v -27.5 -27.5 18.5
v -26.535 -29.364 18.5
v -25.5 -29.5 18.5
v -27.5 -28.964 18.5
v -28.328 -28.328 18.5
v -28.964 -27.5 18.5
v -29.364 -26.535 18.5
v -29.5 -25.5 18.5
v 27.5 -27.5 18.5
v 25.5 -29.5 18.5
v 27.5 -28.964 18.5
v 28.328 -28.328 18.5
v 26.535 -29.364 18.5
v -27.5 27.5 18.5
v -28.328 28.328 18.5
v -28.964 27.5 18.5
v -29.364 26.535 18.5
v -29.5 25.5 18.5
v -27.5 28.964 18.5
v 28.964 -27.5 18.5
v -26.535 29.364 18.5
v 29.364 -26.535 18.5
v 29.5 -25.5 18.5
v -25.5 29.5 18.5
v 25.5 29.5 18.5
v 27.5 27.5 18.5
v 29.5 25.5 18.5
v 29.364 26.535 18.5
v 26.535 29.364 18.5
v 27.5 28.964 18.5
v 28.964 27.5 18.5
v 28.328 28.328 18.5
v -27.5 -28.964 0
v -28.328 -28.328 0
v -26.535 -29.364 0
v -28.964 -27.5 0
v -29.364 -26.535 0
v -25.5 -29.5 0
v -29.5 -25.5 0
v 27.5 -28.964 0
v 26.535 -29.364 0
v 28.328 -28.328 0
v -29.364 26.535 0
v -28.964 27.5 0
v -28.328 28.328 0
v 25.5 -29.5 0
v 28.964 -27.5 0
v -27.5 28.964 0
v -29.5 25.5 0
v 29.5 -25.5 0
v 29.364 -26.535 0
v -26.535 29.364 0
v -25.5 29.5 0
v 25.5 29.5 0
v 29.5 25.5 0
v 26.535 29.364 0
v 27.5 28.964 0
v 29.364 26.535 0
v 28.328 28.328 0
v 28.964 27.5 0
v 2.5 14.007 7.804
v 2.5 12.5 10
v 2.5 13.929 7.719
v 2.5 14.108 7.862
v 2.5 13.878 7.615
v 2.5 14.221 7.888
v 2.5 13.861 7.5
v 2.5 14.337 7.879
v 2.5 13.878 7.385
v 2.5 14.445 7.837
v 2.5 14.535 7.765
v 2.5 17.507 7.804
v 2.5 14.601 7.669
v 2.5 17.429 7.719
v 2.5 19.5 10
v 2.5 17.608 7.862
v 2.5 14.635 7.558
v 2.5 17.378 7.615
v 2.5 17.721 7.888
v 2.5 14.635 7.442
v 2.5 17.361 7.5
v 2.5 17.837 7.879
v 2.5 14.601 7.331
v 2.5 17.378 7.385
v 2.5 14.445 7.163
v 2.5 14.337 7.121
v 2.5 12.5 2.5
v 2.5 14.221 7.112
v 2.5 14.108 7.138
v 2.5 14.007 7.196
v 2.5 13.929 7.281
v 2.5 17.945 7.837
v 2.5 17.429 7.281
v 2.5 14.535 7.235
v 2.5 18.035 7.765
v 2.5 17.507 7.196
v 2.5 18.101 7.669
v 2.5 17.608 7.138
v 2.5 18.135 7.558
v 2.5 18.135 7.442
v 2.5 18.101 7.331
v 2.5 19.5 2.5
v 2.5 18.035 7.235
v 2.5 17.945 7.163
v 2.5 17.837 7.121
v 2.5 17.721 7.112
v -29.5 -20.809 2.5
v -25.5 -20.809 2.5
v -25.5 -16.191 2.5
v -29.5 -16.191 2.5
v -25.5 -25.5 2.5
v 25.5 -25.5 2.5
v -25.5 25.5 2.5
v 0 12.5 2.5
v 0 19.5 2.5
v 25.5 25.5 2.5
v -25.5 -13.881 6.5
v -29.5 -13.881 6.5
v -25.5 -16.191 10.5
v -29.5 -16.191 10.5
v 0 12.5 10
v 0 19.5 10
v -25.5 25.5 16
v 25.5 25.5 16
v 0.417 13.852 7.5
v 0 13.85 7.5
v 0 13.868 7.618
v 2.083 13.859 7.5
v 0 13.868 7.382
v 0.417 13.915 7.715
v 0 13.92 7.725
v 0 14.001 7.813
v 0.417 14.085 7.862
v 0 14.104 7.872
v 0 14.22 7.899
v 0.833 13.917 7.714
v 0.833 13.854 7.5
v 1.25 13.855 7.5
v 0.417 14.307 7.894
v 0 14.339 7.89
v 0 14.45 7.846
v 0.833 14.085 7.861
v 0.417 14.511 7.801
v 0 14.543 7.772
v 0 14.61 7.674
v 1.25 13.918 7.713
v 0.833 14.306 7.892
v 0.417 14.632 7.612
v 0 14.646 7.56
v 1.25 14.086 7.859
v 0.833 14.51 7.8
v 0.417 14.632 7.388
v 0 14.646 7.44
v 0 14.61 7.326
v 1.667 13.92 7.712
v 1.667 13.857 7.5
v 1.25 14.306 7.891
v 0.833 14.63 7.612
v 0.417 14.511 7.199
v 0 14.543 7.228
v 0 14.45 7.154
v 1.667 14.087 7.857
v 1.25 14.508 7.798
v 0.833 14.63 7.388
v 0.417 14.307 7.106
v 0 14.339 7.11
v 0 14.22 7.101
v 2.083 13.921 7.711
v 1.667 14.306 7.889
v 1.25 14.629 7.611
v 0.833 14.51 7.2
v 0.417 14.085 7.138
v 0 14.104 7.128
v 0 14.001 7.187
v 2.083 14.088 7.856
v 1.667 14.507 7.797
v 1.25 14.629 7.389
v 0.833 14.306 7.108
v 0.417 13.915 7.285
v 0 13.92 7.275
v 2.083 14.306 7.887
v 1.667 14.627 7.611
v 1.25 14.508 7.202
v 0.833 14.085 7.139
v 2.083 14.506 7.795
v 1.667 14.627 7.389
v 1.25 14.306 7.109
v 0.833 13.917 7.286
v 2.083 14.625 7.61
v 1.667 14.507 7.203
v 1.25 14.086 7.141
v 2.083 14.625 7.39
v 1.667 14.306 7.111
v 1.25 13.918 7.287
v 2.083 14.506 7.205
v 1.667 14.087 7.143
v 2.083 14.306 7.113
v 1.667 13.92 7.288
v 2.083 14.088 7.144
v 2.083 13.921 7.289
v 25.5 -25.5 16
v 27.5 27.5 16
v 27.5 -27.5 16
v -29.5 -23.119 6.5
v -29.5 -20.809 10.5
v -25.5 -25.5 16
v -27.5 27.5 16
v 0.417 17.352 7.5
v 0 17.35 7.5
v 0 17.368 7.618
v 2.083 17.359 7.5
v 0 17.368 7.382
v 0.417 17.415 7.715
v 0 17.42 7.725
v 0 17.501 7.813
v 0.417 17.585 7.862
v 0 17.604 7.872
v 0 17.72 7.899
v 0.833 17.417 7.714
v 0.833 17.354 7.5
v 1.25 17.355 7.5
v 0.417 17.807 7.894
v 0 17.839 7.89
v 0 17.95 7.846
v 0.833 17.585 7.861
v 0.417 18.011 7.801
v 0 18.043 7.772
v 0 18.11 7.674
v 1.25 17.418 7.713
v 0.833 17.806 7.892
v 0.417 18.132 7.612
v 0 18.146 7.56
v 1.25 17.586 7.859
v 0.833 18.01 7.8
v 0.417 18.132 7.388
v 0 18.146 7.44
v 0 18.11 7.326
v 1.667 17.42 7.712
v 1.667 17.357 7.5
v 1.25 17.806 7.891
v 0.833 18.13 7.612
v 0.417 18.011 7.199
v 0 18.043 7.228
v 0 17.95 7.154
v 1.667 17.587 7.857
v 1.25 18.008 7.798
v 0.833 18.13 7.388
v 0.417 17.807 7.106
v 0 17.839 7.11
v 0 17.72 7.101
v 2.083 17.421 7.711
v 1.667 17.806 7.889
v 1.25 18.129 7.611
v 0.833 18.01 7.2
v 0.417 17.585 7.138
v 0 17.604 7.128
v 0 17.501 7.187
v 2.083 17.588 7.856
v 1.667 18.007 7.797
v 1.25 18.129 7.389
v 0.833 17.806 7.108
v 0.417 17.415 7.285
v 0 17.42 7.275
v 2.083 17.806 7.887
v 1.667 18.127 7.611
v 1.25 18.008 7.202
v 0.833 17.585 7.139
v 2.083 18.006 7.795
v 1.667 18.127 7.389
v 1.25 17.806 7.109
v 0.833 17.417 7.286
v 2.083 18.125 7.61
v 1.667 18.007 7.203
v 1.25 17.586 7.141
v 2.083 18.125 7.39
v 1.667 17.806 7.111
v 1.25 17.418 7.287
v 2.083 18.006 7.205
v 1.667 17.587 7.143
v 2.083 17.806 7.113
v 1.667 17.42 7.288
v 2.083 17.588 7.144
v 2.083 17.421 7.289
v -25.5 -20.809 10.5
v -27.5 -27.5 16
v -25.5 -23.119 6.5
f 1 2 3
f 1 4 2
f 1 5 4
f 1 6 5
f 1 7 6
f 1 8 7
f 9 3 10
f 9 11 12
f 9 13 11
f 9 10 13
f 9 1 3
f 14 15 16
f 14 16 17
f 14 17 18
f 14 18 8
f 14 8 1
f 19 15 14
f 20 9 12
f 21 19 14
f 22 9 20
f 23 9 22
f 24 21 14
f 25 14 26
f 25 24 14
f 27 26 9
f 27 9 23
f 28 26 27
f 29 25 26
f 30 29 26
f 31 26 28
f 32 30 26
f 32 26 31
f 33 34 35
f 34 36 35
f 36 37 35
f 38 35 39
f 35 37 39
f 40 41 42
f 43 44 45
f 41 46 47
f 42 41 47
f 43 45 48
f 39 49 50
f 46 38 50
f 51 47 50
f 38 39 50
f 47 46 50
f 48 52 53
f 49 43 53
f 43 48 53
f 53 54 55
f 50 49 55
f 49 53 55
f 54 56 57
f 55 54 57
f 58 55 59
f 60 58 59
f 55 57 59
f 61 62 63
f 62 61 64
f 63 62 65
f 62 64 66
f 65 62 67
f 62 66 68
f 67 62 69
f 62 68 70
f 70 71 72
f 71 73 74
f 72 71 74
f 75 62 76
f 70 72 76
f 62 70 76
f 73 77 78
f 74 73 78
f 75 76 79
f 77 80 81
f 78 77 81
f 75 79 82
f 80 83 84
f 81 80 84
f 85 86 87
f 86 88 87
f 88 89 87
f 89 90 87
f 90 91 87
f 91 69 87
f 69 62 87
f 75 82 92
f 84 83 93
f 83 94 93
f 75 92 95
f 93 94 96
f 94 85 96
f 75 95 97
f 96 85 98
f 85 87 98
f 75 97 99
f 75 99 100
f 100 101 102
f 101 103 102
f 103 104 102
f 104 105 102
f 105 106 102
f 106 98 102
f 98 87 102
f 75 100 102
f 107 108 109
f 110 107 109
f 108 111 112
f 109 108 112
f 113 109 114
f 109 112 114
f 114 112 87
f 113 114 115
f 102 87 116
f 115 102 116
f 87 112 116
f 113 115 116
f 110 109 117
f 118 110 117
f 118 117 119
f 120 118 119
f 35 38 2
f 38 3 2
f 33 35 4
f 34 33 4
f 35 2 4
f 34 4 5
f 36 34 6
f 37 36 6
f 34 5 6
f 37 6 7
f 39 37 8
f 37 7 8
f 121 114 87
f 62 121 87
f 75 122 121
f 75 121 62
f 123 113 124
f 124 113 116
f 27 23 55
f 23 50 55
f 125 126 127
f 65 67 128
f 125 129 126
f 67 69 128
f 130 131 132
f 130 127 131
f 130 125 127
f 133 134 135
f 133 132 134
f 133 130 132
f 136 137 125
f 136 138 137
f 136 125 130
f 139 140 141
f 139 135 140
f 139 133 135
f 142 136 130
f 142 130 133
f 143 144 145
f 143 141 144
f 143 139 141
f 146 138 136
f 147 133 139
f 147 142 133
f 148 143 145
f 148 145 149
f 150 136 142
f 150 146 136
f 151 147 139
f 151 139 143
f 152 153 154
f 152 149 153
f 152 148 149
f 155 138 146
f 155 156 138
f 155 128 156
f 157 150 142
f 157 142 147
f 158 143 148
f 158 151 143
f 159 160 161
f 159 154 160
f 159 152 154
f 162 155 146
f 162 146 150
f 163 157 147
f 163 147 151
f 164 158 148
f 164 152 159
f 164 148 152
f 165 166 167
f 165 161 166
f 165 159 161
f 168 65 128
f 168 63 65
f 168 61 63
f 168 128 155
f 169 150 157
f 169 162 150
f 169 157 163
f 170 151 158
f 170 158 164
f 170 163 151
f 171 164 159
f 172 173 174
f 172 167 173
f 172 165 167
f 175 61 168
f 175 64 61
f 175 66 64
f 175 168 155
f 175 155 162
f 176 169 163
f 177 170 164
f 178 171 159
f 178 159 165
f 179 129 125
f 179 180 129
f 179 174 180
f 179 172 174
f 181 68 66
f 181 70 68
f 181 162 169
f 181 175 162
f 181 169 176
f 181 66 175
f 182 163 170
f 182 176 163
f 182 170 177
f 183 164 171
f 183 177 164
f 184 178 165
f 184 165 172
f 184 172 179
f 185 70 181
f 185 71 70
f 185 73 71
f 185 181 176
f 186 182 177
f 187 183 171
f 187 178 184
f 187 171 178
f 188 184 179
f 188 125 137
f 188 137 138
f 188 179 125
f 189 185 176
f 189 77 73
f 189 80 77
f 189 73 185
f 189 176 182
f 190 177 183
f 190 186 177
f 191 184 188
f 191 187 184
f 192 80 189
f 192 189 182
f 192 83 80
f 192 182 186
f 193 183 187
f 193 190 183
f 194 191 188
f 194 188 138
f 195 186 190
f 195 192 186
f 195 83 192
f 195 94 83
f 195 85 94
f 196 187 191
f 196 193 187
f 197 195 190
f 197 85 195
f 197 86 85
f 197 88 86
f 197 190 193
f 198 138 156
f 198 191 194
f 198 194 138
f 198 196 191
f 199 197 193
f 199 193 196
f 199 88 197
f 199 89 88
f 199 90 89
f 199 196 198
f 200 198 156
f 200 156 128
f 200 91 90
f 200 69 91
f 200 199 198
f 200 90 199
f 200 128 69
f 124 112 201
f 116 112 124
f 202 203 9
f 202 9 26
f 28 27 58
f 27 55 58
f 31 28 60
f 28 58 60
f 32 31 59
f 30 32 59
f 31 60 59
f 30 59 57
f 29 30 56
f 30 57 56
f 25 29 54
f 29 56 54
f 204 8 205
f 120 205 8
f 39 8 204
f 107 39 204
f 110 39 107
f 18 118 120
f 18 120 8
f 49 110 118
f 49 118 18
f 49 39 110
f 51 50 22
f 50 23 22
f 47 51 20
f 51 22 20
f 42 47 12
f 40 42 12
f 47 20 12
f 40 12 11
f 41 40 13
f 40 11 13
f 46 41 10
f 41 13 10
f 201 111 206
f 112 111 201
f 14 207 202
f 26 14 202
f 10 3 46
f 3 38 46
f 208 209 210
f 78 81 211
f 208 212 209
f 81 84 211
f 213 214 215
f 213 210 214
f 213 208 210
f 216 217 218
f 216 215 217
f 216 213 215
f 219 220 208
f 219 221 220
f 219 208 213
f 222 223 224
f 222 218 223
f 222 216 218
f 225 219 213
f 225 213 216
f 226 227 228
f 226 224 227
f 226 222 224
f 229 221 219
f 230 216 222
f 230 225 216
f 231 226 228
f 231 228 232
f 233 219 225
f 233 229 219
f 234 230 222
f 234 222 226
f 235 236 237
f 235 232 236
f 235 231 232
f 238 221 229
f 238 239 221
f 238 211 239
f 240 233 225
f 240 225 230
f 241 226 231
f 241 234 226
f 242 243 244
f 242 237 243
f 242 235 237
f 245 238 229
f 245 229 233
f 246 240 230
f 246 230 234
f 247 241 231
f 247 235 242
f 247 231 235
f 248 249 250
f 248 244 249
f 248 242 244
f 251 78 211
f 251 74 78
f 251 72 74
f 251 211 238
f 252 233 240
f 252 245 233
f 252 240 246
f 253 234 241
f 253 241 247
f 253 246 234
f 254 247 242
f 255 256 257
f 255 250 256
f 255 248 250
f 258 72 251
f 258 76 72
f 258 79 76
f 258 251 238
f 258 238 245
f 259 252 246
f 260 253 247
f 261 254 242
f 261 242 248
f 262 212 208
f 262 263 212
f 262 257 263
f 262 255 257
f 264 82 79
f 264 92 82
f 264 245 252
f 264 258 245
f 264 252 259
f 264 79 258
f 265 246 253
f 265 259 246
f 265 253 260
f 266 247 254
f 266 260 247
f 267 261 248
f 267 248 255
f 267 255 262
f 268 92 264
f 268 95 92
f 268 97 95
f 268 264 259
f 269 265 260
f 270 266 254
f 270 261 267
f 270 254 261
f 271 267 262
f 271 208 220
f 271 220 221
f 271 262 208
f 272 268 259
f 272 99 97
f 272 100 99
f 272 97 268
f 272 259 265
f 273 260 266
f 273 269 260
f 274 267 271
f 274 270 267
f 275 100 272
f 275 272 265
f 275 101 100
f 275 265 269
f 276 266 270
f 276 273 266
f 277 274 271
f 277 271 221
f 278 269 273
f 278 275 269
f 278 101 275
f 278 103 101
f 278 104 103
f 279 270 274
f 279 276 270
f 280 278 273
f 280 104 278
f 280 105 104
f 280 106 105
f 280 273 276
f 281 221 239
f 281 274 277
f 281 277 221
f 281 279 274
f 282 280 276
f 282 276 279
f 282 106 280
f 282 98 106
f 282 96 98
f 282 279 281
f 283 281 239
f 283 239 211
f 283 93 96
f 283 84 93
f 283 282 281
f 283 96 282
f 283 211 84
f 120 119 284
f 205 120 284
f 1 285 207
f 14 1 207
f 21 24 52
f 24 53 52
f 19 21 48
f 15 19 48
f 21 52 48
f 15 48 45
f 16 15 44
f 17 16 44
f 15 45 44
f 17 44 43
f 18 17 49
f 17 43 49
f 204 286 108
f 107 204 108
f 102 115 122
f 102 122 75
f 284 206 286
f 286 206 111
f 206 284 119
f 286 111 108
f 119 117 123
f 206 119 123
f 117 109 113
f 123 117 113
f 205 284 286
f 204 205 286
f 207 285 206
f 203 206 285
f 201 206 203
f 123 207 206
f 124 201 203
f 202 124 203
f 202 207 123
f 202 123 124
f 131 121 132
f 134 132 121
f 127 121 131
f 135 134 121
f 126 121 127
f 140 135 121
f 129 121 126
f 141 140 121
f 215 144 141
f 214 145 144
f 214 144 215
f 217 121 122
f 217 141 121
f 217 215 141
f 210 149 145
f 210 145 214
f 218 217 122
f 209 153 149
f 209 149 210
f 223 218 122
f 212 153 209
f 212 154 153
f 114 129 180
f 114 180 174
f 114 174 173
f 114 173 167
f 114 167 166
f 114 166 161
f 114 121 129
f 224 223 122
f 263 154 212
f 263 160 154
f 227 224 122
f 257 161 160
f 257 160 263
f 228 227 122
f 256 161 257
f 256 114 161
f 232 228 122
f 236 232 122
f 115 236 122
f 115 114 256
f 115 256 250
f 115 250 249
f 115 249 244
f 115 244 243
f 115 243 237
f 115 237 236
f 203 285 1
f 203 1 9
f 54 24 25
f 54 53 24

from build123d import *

# Parameters (mm, degrees)
F0_W      = 59
F0_H      = 59
F0_W_2    = 51
F0_H_2    = 51
F1_DEPTH  = 16
F2_W      = 59
F2_H      = 59
F2_W_2    = 55
F2_H_2    = 55
F3_DEPTH  = 2.5
F4_W      = 51
F4_H      = 51
F5_DEPTH  = 2.5
F7_W      = 2.5
F7_H      = 7
F8_DEPTH  = 10
F9_R      = 0.4
F10_DEPTH = 2.5
F10_TAPER = 0.25
F11_R     = 4
F12_R     = 4
F14_DEPTH = 25


with BuildPart() as f1:
    # F0 (on Top) → F1 (new body)
    with BuildSketch(Plane.XY):
        Rectangle(F0_W, F0_H)
        Rectangle(F0_W_2, F0_H_2, mode=Mode.SUBTRACT)
    extrude(amount=F1_DEPTH)

    # F2 (on face) → F3 (join)
    with BuildSketch(Plane.XY.offset(16)):
        Rectangle(F2_W, F2_H)
        Rectangle(F2_W_2, F2_H_2, mode=Mode.SUBTRACT)
    extrude(amount=F3_DEPTH)

    # F4 (on face) → F5 (join)
    with BuildSketch(Plane(origin=(0, 0, 0), x_dir=(1, 0, 0), z_dir=(0, 0, -1))):
        Rectangle(F4_W, F4_H)
    extrude(amount=-F5_DEPTH)

    # F7 (on face) → F8 (join)
    with BuildSketch(Plane.XY):
        with Locations((1.25, 16)):
            Rectangle(F7_W, F7_H)
    extrude(amount=F8_DEPTH)

    # F9 (on face) → F10 (cut)
    with BuildSketch(Plane(origin=(0, 0, 0), x_dir=(0, -1, 0), z_dir=(-1, 0, 0))):
        with Locations((-17.75, 7.5)):
            Circle(F9_R)
        with Locations((-14.25, 7.5)):
            Circle(F9_R)
    extrude(amount=-F10_DEPTH, taper=F10_TAPER, mode=Mode.SUBTRACT)

    # F11
    f11_edges = [f1.edges().sort_by_distance(p)[0] for p in [
        (29.5, 29.5, 9.25),
    ]]
    fillet(f11_edges, radius=F11_R)

    # F12
    f12_edges = [f1.edges().sort_by_distance(p)[0] for p in [
        (-29.5, 29.5, 9.25),
        (-29.5, -29.5, 9.25),
        (29.5, -29.5, 9.25),
    ]]
    fillet(f12_edges, radius=F12_R)

    # F13 (on face) → F14 (cut)
    with BuildSketch(Plane.YZ.offset(-25.5)):
        Polygon((-16.1905989232, 2.5), (-13.8811978465, 6.5), (-16.1905989232, 10.5), (-20.8094010768, 10.5), (-23.1188021535, 6.5), (-20.8094010768, 2.5), align=None)
    extrude(amount=-F14_DEPTH, mode=Mode.SUBTRACT)


solid = f1.part
